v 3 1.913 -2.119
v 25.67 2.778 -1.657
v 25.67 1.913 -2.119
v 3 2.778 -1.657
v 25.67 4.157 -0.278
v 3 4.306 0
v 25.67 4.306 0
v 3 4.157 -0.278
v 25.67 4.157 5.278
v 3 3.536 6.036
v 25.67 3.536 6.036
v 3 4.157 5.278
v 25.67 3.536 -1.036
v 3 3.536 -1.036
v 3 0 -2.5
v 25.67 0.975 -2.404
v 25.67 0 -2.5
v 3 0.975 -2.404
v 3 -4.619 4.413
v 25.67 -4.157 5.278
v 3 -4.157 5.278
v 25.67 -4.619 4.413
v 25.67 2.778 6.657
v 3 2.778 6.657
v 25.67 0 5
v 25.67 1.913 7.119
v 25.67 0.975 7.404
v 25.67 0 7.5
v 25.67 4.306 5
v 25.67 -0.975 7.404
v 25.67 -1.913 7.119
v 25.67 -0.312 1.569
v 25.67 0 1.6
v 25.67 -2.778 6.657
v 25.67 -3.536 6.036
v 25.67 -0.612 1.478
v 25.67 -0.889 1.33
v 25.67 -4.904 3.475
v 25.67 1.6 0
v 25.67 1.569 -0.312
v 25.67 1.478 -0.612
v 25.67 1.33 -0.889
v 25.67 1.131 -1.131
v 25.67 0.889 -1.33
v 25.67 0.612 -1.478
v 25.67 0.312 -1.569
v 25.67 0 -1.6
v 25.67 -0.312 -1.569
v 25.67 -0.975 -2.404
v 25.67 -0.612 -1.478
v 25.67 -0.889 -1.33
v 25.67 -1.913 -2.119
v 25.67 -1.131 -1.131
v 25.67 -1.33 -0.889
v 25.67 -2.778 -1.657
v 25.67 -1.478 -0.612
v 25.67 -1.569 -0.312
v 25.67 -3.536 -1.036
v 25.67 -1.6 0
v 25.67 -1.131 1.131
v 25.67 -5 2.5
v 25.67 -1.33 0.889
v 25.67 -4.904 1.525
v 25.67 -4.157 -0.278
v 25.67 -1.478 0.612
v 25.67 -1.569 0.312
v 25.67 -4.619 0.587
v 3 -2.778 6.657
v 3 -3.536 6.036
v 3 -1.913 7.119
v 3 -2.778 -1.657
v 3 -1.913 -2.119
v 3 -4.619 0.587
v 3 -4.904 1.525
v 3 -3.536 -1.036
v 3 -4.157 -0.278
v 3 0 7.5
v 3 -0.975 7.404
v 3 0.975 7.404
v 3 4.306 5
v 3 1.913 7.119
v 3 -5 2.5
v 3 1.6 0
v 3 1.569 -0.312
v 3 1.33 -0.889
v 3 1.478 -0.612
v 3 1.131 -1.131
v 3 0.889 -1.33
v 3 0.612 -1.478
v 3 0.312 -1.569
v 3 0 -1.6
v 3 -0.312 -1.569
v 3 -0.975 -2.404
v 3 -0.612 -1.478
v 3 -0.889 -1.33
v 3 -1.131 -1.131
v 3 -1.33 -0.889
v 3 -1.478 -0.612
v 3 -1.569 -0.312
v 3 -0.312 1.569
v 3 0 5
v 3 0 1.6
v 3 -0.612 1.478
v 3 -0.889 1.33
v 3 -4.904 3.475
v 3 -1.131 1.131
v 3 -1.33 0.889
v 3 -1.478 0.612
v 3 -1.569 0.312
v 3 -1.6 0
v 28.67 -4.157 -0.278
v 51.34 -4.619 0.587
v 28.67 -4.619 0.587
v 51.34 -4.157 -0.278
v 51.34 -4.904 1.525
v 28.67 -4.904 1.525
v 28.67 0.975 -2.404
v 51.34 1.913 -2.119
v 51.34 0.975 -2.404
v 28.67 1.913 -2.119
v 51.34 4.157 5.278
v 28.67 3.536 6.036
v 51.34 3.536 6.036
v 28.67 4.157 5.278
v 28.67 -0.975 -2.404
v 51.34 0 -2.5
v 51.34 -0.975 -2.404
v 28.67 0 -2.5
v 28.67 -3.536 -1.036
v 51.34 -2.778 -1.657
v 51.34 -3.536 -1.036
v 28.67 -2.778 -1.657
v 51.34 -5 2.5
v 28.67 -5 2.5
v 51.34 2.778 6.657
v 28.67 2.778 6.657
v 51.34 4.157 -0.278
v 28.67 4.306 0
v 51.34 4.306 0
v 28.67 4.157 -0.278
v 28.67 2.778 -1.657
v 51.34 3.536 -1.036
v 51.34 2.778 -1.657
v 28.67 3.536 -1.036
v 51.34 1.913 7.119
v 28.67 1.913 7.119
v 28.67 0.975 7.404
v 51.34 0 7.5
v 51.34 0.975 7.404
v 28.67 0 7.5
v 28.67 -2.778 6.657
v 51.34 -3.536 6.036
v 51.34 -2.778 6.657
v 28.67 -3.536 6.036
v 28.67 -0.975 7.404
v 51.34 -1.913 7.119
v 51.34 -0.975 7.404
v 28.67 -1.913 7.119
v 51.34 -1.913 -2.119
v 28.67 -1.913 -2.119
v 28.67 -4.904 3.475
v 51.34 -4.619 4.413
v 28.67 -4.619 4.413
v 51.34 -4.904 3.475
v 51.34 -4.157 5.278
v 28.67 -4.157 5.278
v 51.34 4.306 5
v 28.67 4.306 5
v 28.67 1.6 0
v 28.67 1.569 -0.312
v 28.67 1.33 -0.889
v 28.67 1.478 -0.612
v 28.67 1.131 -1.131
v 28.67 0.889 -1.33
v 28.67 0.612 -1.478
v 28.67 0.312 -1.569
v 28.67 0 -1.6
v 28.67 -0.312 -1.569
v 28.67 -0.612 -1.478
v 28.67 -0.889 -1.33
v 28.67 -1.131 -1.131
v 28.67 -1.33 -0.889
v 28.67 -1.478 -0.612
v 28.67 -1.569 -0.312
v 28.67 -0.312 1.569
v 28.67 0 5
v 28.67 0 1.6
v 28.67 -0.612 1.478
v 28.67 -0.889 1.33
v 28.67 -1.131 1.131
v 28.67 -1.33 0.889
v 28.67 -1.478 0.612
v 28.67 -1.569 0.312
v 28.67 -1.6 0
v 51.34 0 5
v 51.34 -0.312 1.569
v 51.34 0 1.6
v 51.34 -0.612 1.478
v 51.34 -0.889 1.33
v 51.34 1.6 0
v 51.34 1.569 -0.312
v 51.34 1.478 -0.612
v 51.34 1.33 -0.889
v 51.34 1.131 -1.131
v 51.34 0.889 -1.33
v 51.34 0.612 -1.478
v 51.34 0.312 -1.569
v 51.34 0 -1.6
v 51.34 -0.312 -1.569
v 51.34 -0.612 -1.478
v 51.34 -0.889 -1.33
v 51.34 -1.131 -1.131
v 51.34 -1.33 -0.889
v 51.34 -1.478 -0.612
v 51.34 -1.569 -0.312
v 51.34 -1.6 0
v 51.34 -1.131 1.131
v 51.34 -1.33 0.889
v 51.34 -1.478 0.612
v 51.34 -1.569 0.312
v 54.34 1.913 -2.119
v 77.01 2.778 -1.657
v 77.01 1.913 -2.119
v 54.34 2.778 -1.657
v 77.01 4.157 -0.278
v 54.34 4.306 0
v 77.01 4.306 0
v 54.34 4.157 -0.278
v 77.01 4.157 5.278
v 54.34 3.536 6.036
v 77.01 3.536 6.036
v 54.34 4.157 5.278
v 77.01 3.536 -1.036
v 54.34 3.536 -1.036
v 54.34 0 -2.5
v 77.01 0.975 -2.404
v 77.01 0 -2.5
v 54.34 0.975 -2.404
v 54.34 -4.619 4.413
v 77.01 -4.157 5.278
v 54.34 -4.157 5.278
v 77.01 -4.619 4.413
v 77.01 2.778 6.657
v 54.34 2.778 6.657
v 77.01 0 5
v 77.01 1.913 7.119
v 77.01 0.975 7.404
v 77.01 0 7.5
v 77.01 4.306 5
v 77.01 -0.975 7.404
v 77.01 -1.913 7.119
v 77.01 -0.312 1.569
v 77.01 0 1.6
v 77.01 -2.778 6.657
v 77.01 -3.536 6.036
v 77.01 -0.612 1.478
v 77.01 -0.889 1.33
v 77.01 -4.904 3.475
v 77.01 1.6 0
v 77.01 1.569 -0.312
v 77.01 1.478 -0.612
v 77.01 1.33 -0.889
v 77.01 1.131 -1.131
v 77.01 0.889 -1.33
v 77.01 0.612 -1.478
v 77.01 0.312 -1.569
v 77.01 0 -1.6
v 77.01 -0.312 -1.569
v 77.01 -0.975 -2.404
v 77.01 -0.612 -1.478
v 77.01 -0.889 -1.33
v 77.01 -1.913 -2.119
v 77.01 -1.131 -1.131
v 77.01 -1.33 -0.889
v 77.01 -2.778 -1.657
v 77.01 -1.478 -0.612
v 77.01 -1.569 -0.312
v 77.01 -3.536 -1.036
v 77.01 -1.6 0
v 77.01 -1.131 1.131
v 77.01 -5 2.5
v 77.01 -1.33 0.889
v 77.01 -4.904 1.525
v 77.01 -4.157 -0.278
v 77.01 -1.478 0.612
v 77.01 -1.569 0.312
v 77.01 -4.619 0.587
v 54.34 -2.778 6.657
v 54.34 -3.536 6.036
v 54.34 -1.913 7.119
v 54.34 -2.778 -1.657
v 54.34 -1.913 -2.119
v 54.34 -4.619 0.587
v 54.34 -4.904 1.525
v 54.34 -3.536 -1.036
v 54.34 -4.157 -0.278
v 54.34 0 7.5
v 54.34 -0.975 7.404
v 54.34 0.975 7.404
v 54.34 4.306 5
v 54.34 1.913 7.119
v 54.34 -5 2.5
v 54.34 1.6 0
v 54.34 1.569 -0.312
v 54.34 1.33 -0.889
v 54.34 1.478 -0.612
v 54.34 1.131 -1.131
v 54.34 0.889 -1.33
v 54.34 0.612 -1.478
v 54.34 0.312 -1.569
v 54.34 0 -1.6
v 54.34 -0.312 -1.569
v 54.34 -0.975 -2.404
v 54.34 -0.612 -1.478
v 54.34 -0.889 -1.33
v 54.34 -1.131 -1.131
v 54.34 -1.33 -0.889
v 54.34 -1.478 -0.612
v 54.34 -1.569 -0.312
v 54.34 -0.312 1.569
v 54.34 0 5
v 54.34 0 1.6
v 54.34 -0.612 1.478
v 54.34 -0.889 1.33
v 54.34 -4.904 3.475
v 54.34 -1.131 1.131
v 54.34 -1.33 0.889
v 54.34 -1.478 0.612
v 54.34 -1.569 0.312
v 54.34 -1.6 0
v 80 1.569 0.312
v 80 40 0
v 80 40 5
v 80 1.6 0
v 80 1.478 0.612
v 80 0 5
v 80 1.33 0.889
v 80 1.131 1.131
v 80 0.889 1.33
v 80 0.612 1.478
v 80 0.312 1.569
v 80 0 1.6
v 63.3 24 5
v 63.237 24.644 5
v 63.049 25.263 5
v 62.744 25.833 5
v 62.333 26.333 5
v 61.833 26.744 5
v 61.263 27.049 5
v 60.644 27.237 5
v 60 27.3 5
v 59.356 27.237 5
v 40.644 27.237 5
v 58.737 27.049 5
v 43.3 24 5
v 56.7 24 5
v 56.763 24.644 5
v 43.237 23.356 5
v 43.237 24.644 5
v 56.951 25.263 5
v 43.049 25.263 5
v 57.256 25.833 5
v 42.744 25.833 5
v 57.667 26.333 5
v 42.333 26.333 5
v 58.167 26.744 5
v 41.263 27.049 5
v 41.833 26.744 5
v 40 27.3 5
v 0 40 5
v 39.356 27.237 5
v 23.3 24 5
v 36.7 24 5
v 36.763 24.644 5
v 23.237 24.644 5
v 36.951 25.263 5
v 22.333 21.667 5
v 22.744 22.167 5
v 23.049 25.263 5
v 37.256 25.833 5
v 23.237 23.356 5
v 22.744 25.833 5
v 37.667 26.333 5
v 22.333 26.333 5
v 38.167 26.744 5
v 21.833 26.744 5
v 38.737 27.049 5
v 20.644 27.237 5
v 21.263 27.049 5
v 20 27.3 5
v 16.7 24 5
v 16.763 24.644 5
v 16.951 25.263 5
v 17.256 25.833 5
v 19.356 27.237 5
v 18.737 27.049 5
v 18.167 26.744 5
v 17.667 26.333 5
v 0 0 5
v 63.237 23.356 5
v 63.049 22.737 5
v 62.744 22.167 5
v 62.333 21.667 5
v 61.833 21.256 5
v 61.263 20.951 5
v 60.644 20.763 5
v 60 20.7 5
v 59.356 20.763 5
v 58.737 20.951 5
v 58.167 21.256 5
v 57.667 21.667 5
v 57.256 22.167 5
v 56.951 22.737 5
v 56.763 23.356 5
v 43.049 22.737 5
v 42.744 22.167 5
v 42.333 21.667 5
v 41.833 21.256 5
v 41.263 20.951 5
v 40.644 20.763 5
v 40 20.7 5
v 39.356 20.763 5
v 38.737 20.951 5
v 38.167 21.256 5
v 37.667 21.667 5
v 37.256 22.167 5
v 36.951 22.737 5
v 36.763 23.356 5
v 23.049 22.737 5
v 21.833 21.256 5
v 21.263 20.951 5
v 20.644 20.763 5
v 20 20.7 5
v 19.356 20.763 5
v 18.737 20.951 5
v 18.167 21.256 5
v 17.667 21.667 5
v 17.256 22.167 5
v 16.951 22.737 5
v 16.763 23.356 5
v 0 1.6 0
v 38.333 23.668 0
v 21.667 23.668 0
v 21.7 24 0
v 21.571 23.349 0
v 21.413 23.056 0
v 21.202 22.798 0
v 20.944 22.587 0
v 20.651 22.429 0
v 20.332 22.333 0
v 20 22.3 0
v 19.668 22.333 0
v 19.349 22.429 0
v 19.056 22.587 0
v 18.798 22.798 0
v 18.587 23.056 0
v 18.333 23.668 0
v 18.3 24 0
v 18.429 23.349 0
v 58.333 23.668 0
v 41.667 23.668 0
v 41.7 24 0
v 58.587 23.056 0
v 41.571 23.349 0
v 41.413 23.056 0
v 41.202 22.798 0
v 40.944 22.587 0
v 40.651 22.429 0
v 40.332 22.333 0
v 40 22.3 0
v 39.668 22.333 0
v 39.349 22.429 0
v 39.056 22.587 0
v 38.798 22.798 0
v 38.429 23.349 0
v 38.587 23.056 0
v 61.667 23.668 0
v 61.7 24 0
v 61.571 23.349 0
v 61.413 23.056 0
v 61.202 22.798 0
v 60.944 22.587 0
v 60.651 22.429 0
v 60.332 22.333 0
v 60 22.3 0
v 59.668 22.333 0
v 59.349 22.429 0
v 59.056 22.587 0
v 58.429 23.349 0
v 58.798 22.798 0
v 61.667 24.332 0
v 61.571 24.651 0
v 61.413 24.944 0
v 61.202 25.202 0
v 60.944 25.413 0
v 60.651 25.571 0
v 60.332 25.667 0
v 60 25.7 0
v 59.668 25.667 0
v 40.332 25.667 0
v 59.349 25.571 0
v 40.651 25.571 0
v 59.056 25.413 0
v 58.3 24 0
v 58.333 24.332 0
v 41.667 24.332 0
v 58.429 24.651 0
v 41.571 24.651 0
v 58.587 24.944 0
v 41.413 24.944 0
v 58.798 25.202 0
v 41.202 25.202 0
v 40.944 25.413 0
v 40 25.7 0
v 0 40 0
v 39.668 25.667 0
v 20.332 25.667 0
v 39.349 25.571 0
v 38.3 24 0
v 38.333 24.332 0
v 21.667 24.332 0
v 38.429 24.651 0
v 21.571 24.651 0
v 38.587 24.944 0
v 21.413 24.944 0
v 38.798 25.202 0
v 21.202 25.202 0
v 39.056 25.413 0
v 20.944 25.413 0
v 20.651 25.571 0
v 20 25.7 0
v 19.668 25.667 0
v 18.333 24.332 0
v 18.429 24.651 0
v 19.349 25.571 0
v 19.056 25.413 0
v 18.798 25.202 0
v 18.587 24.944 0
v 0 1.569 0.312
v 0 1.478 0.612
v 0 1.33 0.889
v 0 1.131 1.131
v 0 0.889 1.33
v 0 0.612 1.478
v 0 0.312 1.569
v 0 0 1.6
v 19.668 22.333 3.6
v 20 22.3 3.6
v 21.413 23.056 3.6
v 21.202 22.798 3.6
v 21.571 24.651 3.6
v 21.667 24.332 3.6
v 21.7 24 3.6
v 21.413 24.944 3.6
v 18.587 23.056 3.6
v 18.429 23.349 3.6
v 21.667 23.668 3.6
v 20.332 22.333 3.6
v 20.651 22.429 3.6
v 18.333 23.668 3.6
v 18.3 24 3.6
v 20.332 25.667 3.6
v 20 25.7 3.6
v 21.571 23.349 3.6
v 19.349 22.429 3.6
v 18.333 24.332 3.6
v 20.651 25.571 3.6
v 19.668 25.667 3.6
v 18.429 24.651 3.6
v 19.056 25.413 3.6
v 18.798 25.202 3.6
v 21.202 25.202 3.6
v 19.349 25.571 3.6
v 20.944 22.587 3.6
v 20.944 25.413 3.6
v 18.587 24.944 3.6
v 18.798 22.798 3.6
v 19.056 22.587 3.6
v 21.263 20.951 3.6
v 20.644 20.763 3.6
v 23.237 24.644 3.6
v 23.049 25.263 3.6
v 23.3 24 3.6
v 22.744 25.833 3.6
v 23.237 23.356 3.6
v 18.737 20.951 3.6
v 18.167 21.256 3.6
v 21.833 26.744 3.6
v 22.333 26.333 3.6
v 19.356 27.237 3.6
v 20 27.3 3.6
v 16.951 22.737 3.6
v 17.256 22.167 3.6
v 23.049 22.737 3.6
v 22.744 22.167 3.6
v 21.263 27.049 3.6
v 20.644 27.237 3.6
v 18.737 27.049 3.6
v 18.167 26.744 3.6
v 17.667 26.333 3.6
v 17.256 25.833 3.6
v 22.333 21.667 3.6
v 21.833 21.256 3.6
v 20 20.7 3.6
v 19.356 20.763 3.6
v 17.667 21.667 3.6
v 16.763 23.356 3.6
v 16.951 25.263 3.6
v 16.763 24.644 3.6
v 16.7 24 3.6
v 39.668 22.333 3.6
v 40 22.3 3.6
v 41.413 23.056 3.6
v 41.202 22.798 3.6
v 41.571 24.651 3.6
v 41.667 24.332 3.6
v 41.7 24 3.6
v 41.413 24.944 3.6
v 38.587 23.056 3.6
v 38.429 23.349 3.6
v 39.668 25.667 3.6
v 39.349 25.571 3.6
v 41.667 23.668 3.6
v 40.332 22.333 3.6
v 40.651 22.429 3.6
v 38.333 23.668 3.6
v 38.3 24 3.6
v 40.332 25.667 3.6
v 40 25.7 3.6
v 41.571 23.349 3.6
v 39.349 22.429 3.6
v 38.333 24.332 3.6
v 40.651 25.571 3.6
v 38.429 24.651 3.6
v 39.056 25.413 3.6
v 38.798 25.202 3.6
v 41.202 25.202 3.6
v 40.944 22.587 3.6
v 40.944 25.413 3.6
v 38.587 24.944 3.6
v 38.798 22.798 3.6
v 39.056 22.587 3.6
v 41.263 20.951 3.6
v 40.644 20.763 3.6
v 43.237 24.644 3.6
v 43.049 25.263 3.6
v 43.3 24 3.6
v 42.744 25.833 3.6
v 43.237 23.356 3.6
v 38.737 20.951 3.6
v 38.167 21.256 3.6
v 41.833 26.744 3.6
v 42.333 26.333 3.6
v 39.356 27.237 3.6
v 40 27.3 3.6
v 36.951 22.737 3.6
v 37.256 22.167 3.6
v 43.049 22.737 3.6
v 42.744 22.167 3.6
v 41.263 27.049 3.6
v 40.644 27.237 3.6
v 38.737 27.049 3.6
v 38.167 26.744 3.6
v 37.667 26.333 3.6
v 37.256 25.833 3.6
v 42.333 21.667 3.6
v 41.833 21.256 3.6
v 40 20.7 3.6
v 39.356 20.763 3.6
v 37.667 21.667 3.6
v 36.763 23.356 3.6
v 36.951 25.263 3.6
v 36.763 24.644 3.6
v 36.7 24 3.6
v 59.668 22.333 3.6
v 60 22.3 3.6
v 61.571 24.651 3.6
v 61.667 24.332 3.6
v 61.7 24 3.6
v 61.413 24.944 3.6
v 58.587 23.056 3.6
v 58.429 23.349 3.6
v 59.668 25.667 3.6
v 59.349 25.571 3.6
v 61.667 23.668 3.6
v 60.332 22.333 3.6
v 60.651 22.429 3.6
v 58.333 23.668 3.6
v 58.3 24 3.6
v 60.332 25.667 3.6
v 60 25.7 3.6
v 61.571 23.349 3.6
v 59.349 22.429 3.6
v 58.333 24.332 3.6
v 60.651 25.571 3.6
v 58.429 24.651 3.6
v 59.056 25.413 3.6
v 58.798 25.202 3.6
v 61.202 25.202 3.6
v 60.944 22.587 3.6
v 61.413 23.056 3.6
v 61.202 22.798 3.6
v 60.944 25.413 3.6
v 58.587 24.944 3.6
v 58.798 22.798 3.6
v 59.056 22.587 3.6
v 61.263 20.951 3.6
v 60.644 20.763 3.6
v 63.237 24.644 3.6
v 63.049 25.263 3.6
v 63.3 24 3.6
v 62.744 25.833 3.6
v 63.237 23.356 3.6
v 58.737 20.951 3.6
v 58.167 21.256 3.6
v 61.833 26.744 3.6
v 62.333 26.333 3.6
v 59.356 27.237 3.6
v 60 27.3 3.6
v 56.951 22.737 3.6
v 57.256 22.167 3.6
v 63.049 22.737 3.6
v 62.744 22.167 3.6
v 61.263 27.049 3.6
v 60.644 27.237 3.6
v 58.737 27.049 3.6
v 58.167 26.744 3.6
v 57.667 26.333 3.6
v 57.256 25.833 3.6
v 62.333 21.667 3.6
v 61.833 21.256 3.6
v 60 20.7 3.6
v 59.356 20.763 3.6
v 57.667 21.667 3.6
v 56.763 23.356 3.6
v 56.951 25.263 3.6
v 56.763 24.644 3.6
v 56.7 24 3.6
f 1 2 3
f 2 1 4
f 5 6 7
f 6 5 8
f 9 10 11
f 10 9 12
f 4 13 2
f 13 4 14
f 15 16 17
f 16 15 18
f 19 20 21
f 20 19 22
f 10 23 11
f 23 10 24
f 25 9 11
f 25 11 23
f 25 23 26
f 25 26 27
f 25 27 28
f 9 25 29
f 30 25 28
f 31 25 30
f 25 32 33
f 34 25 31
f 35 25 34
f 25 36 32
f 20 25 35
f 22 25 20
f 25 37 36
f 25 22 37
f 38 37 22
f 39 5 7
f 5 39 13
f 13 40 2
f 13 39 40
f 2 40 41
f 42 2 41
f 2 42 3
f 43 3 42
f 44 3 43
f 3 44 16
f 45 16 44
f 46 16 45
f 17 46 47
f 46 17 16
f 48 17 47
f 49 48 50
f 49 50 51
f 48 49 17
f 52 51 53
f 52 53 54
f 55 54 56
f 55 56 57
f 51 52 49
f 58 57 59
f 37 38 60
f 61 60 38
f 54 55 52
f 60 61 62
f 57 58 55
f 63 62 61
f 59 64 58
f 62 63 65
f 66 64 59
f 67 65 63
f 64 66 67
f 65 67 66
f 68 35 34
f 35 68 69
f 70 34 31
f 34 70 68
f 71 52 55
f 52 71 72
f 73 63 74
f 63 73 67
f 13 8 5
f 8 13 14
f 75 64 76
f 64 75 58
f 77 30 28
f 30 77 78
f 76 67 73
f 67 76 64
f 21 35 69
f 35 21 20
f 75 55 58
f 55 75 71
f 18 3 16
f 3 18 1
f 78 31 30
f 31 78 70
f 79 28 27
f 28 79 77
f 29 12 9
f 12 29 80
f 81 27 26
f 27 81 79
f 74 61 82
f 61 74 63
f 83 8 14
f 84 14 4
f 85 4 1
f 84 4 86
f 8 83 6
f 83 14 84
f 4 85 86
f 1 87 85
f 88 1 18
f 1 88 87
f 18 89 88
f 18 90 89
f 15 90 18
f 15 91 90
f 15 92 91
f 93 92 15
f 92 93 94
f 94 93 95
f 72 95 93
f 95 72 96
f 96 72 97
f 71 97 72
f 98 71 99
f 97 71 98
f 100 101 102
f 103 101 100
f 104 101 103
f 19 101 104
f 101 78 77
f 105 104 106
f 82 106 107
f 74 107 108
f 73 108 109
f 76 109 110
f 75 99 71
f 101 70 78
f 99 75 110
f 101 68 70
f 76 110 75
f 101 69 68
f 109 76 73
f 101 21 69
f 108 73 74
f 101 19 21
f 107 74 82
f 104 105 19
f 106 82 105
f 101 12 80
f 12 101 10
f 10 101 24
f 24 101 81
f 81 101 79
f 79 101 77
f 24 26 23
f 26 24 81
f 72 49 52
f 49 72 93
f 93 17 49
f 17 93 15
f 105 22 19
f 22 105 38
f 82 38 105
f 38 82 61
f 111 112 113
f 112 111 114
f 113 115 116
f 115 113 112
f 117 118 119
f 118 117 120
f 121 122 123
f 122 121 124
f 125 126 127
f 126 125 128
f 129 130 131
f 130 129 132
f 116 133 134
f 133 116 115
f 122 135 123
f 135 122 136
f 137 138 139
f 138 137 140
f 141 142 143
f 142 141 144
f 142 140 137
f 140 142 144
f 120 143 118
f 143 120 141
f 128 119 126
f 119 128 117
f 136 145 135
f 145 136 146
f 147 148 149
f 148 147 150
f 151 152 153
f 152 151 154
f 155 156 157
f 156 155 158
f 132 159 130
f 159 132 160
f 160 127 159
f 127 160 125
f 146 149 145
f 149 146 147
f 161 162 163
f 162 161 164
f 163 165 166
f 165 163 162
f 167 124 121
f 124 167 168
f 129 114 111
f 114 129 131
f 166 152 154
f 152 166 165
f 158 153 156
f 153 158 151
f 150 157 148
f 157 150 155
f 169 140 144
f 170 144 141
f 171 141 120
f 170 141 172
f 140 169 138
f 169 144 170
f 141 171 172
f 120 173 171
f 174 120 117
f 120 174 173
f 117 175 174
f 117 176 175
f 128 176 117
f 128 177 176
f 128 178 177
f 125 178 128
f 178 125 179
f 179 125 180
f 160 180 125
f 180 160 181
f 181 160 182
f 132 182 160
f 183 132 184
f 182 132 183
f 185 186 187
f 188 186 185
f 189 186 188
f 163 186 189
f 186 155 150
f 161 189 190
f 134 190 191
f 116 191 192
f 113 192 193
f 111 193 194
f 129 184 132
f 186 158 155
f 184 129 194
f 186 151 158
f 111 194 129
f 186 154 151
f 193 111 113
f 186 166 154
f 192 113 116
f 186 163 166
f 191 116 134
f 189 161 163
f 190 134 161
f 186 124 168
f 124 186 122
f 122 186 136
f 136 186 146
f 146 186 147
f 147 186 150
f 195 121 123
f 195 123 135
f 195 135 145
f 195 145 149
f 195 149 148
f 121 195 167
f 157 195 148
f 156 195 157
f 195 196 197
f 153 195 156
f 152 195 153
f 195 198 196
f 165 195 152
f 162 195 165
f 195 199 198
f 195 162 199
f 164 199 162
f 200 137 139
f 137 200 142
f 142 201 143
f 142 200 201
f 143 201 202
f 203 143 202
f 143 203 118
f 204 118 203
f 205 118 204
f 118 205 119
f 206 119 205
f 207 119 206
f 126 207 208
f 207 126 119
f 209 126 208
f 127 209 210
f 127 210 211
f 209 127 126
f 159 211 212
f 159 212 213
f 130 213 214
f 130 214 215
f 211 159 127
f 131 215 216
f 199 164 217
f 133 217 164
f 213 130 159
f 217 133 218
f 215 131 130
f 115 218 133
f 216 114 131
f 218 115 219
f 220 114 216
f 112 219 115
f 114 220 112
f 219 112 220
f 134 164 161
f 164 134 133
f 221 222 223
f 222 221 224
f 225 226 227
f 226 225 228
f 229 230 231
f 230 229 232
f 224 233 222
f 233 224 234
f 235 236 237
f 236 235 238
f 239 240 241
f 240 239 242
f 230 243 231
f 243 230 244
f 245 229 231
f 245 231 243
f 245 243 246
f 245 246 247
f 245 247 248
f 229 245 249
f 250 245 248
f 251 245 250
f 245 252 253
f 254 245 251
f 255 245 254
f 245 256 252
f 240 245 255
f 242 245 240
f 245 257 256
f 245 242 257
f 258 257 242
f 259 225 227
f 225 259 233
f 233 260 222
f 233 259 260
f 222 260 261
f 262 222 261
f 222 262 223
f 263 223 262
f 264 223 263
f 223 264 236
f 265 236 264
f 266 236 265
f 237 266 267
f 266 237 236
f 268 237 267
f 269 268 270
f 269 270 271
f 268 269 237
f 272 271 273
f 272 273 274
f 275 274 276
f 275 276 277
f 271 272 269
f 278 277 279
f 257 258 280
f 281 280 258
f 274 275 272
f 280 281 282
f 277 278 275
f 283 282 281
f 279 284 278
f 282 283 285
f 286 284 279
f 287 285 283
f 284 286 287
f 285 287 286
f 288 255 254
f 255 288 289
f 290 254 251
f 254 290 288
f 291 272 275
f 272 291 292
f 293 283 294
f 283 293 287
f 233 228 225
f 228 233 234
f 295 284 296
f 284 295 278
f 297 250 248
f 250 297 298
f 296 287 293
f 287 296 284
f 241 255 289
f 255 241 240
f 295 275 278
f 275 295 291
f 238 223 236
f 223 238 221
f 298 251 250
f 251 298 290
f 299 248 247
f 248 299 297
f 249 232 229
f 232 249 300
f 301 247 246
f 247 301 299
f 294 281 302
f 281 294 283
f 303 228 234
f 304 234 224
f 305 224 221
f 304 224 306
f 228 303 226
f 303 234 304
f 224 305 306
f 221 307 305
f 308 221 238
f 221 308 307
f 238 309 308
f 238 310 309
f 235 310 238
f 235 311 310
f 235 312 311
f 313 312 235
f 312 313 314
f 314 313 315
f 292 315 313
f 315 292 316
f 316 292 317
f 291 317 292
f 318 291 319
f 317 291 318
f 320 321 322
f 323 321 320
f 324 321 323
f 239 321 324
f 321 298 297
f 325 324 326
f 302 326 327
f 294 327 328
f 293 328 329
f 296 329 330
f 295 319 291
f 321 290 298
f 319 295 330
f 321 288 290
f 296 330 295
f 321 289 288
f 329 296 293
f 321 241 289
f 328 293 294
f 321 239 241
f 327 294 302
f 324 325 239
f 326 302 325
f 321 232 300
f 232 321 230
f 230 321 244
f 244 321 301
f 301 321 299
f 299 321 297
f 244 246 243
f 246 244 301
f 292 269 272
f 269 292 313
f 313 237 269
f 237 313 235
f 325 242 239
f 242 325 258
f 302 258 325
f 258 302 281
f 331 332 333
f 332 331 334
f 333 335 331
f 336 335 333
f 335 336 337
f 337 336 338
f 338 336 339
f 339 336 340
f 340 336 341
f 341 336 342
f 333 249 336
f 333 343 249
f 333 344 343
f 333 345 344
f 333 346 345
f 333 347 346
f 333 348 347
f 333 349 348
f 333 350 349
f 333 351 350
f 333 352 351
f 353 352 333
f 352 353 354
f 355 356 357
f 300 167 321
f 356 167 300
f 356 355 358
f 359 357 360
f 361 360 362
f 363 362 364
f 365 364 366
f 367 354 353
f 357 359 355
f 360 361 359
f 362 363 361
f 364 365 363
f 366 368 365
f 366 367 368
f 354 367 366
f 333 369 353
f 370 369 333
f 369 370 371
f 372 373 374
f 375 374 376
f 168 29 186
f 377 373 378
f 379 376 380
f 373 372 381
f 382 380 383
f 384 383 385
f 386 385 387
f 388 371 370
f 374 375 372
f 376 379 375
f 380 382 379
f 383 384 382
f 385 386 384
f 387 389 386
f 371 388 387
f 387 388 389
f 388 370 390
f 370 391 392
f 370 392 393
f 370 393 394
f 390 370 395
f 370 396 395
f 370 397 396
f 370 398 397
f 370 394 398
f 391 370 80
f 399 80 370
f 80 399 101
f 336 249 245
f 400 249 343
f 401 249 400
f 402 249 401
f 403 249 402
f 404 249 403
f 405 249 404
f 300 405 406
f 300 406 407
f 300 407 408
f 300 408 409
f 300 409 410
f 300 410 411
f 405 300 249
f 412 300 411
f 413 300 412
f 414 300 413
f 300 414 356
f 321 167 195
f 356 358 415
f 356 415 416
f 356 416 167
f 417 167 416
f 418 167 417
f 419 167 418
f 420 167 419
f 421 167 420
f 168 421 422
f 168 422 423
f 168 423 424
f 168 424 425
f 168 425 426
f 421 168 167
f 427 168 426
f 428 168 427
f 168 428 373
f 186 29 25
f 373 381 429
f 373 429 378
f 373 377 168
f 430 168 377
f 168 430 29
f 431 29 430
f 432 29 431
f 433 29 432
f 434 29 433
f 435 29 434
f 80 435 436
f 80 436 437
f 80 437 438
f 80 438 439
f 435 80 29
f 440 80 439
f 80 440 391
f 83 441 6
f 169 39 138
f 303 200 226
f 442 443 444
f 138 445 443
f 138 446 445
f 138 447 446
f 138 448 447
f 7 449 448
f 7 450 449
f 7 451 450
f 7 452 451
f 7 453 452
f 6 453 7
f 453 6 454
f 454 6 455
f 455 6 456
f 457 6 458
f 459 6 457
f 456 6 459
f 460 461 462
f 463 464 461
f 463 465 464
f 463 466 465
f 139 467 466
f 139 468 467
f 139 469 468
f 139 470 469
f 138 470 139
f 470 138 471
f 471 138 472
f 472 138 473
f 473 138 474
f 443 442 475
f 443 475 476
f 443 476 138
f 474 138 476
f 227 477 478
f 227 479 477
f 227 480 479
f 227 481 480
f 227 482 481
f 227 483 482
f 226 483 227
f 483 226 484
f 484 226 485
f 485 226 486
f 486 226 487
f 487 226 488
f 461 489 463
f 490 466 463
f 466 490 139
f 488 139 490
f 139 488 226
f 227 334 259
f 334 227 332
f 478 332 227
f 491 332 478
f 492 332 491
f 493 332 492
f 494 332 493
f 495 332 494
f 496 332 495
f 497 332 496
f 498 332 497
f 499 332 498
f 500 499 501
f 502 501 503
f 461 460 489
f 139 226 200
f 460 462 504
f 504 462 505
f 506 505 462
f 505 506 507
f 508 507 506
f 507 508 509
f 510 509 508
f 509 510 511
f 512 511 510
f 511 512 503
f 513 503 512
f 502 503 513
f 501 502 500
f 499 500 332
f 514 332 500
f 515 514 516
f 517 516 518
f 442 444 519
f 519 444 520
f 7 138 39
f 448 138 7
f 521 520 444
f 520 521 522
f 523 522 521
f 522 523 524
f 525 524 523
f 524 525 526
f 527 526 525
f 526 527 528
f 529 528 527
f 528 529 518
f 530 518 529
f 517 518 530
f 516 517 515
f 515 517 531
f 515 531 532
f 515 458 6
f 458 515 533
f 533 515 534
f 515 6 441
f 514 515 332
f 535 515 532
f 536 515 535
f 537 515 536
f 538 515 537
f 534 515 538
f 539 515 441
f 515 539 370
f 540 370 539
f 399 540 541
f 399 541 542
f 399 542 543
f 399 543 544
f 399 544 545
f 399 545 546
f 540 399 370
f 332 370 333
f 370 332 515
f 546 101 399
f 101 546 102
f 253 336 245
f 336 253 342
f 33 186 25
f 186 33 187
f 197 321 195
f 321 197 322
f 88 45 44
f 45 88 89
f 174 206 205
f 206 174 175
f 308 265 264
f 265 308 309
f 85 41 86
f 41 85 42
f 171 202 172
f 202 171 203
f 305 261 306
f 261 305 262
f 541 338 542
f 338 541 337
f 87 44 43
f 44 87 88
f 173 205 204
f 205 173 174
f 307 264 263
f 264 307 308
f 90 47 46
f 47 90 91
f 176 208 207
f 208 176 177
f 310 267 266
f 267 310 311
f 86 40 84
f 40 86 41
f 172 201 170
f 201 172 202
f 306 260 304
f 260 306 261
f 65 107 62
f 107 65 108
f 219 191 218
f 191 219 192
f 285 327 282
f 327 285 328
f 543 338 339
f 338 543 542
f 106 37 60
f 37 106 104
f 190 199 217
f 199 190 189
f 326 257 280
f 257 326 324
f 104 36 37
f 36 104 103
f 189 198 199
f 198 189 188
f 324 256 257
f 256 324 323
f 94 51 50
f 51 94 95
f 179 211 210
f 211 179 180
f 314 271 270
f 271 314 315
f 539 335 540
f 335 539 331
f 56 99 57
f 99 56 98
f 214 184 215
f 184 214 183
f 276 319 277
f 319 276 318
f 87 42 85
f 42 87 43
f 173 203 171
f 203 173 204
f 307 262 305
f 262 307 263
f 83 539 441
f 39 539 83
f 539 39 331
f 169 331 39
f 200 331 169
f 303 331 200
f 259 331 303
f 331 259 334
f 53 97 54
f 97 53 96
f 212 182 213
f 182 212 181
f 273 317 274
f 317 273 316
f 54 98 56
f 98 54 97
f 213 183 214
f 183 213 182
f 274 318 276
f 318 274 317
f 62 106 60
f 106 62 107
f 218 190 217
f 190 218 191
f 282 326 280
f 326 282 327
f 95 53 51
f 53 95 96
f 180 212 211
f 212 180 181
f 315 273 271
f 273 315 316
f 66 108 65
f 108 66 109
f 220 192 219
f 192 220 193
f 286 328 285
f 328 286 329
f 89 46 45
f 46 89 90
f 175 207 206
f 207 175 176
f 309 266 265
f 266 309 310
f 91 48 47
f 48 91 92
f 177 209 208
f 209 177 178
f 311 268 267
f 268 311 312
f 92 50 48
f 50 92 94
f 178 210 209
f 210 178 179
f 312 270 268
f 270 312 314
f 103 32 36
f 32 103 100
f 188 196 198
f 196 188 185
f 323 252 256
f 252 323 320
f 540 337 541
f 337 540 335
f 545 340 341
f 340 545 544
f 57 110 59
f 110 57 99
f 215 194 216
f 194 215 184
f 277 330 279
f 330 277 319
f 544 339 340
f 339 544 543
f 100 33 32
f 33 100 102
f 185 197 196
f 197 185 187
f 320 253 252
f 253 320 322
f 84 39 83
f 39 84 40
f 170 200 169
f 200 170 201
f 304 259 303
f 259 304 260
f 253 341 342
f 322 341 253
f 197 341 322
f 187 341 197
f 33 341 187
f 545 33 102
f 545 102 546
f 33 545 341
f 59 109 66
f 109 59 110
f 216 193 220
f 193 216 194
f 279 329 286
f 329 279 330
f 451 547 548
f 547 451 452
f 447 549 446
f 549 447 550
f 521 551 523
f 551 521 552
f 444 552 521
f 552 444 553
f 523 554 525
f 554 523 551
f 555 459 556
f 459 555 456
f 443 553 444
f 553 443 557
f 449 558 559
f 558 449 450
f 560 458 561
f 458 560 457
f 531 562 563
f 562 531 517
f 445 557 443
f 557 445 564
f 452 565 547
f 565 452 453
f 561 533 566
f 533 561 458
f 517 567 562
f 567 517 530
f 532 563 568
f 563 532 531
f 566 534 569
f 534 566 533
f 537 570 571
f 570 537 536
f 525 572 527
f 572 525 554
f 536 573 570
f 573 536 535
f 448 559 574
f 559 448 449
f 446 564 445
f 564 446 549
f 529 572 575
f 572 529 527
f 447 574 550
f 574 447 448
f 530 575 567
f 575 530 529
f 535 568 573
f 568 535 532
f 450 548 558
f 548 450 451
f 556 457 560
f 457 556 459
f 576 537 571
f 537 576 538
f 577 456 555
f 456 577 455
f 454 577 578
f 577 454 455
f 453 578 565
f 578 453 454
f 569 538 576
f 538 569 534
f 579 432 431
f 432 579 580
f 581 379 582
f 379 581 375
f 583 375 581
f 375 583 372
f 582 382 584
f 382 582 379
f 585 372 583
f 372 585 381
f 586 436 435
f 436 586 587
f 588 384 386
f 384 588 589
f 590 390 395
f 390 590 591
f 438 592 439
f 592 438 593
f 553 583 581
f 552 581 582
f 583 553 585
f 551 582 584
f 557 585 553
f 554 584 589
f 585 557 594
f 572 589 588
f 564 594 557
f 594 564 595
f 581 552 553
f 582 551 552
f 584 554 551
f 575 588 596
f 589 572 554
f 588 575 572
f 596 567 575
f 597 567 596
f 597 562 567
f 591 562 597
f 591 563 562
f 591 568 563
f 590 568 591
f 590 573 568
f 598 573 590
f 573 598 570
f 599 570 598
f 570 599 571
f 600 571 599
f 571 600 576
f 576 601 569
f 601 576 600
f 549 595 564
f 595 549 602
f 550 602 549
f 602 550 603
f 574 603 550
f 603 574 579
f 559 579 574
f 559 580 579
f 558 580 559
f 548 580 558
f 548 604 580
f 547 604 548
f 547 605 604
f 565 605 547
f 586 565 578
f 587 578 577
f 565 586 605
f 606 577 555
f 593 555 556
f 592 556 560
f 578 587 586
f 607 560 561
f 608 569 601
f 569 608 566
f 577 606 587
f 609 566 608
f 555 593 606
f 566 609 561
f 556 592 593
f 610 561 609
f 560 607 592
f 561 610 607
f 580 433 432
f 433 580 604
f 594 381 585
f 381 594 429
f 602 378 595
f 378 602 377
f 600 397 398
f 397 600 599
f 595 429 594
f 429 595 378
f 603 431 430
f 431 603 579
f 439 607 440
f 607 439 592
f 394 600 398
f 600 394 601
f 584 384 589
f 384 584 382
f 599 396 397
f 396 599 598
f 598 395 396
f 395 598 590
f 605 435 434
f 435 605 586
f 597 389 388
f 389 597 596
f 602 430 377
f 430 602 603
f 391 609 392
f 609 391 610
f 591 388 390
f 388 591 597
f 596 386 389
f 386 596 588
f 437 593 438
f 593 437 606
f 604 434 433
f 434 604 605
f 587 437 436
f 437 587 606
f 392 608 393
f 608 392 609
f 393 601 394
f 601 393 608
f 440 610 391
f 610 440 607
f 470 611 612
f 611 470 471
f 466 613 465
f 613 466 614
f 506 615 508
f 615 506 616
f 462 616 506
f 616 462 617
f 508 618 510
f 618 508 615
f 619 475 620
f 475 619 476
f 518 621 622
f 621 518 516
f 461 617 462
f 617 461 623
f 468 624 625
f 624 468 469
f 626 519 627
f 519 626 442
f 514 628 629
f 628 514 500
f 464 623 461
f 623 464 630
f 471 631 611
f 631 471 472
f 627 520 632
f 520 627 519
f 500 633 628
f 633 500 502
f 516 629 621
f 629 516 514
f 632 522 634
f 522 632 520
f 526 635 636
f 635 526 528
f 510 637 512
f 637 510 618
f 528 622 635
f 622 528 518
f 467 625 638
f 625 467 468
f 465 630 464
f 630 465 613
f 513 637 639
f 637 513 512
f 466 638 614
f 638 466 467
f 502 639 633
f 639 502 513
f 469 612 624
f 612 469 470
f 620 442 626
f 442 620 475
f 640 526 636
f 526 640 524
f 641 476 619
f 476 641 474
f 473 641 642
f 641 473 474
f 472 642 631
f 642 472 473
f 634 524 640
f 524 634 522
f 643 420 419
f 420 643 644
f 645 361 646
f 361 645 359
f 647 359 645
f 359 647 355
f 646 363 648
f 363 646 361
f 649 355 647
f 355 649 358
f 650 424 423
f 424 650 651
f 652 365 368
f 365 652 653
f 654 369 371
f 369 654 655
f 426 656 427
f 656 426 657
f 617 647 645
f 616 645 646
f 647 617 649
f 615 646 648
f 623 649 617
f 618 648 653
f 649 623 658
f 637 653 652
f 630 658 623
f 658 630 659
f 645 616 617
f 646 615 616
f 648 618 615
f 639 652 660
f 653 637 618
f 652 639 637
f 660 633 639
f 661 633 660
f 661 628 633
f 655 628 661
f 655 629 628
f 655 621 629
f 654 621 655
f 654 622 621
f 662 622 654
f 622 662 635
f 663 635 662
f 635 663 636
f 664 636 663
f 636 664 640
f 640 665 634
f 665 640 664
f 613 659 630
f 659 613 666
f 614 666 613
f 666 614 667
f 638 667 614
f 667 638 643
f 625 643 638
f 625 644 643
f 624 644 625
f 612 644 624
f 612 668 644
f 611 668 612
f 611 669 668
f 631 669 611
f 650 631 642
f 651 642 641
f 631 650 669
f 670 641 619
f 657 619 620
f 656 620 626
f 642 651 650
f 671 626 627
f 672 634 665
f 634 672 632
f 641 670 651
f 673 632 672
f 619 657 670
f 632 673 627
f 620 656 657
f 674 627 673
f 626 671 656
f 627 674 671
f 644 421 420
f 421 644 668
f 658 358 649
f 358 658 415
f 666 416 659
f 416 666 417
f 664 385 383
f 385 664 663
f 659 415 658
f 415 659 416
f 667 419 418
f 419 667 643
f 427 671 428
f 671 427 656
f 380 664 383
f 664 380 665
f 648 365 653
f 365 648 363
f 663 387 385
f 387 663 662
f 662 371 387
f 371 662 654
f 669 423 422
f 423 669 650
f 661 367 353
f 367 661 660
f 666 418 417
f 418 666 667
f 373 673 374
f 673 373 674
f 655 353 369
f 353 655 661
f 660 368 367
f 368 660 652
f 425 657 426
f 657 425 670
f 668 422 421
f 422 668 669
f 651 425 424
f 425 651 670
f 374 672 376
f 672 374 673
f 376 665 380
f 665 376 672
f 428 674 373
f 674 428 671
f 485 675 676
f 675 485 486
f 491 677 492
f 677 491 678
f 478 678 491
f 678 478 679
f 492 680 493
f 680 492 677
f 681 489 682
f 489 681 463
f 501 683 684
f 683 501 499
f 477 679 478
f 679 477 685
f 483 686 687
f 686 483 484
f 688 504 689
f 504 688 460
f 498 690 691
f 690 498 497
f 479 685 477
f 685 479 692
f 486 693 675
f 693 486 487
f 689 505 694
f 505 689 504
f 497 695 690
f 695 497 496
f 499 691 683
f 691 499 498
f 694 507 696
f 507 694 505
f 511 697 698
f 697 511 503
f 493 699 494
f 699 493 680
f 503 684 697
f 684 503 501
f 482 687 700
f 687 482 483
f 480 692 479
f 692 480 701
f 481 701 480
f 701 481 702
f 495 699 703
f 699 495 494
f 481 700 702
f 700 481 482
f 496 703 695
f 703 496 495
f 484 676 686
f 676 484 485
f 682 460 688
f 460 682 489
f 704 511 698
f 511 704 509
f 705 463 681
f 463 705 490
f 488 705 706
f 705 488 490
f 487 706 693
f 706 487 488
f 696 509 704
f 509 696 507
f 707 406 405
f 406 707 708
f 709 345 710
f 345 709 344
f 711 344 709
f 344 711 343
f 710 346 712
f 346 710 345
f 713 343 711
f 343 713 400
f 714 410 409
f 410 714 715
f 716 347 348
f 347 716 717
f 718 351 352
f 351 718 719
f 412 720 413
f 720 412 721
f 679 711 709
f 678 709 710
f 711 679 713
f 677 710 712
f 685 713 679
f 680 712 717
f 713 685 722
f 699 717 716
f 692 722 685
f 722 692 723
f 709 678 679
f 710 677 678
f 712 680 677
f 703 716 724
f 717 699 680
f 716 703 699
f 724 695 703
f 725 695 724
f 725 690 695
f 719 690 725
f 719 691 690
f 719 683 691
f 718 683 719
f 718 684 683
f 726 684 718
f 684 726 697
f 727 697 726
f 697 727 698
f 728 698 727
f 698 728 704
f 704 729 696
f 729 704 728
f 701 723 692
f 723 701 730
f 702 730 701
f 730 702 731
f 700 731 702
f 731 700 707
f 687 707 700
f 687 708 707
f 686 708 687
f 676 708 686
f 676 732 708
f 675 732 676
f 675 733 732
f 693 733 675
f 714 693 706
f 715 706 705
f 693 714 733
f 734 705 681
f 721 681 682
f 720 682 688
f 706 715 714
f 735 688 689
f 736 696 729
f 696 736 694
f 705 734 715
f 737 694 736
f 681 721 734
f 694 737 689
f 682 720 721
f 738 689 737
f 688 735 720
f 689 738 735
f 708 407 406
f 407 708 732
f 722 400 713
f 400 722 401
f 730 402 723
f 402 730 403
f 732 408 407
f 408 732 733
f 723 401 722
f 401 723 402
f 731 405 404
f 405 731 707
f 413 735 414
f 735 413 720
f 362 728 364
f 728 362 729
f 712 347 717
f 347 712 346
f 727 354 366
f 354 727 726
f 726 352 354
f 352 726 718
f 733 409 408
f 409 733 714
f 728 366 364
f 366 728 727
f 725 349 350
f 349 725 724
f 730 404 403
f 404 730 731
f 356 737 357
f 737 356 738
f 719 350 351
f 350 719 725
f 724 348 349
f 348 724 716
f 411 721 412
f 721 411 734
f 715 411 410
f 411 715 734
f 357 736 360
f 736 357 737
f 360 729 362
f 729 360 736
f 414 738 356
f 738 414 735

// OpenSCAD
$fn = 32;

// ----------------------------------------------------------------------
// Hinge leaf: 80 x 45 x 10 mm
// ----------------------------------------------------------------------

// --- parameters (mm) ---
leaf_len = 80;            // leaf length, X
leaf_w = 40;              // leaf width, Y
leaf_t = 5;               // leaf thickness
knuckle_d = 10;           // knuckle diameter
knuckle_w = 22.67;        // knuckle width
knuckle_n = 3;            // number of knuckles
pin_d = 3.2;              // pin bore
gap = 3;                  // gap between the knuckles
screw_d = 3.4;            // screw clearance
cs_d = 6.6;               // countersink diameter
cs_h = 1.4;               // countersink depth

module leaf() {
  cube([leaf_len, leaf_w, leaf_t]);
}

module knuckles() {
  /* barrels sit on the leaf edge, the pin axis at half the leaf thickness */
  for (i = [0 : knuckle_n - 1])
    translate([gap + i * (knuckle_w + gap), 0, leaf_t * 0.5])
      rotate([0, 90, 0]) cylinder(h = knuckle_w, d = knuckle_d);
}

difference() {
  union() {
    leaf();
    knuckles();
  }
  rotate([0, 90, 0]) translate([0, 0, -1])
    cylinder(h = leaf_len + 2, d = pin_d);
  translate([20, leaf_w * 0.6, -1]) cylinder(h = leaf_t + 2, d = screw_d);
  translate([20, leaf_w * 0.6, leaf_t - cs_h]) cylinder(h = cs_h + 0.5, d = cs_d);
  translate([40, leaf_w * 0.6, -1]) cylinder(h = leaf_t + 2, d = screw_d);
  translate([40, leaf_w * 0.6, leaf_t - cs_h]) cylinder(h = cs_h + 0.5, d = cs_d);
  translate([60, leaf_w * 0.6, -1]) cylinder(h = leaf_t + 2, d = screw_d);
  translate([60, leaf_w * 0.6, leaf_t - cs_h]) cylinder(h = cs_h + 0.5, d = cs_d);
}
